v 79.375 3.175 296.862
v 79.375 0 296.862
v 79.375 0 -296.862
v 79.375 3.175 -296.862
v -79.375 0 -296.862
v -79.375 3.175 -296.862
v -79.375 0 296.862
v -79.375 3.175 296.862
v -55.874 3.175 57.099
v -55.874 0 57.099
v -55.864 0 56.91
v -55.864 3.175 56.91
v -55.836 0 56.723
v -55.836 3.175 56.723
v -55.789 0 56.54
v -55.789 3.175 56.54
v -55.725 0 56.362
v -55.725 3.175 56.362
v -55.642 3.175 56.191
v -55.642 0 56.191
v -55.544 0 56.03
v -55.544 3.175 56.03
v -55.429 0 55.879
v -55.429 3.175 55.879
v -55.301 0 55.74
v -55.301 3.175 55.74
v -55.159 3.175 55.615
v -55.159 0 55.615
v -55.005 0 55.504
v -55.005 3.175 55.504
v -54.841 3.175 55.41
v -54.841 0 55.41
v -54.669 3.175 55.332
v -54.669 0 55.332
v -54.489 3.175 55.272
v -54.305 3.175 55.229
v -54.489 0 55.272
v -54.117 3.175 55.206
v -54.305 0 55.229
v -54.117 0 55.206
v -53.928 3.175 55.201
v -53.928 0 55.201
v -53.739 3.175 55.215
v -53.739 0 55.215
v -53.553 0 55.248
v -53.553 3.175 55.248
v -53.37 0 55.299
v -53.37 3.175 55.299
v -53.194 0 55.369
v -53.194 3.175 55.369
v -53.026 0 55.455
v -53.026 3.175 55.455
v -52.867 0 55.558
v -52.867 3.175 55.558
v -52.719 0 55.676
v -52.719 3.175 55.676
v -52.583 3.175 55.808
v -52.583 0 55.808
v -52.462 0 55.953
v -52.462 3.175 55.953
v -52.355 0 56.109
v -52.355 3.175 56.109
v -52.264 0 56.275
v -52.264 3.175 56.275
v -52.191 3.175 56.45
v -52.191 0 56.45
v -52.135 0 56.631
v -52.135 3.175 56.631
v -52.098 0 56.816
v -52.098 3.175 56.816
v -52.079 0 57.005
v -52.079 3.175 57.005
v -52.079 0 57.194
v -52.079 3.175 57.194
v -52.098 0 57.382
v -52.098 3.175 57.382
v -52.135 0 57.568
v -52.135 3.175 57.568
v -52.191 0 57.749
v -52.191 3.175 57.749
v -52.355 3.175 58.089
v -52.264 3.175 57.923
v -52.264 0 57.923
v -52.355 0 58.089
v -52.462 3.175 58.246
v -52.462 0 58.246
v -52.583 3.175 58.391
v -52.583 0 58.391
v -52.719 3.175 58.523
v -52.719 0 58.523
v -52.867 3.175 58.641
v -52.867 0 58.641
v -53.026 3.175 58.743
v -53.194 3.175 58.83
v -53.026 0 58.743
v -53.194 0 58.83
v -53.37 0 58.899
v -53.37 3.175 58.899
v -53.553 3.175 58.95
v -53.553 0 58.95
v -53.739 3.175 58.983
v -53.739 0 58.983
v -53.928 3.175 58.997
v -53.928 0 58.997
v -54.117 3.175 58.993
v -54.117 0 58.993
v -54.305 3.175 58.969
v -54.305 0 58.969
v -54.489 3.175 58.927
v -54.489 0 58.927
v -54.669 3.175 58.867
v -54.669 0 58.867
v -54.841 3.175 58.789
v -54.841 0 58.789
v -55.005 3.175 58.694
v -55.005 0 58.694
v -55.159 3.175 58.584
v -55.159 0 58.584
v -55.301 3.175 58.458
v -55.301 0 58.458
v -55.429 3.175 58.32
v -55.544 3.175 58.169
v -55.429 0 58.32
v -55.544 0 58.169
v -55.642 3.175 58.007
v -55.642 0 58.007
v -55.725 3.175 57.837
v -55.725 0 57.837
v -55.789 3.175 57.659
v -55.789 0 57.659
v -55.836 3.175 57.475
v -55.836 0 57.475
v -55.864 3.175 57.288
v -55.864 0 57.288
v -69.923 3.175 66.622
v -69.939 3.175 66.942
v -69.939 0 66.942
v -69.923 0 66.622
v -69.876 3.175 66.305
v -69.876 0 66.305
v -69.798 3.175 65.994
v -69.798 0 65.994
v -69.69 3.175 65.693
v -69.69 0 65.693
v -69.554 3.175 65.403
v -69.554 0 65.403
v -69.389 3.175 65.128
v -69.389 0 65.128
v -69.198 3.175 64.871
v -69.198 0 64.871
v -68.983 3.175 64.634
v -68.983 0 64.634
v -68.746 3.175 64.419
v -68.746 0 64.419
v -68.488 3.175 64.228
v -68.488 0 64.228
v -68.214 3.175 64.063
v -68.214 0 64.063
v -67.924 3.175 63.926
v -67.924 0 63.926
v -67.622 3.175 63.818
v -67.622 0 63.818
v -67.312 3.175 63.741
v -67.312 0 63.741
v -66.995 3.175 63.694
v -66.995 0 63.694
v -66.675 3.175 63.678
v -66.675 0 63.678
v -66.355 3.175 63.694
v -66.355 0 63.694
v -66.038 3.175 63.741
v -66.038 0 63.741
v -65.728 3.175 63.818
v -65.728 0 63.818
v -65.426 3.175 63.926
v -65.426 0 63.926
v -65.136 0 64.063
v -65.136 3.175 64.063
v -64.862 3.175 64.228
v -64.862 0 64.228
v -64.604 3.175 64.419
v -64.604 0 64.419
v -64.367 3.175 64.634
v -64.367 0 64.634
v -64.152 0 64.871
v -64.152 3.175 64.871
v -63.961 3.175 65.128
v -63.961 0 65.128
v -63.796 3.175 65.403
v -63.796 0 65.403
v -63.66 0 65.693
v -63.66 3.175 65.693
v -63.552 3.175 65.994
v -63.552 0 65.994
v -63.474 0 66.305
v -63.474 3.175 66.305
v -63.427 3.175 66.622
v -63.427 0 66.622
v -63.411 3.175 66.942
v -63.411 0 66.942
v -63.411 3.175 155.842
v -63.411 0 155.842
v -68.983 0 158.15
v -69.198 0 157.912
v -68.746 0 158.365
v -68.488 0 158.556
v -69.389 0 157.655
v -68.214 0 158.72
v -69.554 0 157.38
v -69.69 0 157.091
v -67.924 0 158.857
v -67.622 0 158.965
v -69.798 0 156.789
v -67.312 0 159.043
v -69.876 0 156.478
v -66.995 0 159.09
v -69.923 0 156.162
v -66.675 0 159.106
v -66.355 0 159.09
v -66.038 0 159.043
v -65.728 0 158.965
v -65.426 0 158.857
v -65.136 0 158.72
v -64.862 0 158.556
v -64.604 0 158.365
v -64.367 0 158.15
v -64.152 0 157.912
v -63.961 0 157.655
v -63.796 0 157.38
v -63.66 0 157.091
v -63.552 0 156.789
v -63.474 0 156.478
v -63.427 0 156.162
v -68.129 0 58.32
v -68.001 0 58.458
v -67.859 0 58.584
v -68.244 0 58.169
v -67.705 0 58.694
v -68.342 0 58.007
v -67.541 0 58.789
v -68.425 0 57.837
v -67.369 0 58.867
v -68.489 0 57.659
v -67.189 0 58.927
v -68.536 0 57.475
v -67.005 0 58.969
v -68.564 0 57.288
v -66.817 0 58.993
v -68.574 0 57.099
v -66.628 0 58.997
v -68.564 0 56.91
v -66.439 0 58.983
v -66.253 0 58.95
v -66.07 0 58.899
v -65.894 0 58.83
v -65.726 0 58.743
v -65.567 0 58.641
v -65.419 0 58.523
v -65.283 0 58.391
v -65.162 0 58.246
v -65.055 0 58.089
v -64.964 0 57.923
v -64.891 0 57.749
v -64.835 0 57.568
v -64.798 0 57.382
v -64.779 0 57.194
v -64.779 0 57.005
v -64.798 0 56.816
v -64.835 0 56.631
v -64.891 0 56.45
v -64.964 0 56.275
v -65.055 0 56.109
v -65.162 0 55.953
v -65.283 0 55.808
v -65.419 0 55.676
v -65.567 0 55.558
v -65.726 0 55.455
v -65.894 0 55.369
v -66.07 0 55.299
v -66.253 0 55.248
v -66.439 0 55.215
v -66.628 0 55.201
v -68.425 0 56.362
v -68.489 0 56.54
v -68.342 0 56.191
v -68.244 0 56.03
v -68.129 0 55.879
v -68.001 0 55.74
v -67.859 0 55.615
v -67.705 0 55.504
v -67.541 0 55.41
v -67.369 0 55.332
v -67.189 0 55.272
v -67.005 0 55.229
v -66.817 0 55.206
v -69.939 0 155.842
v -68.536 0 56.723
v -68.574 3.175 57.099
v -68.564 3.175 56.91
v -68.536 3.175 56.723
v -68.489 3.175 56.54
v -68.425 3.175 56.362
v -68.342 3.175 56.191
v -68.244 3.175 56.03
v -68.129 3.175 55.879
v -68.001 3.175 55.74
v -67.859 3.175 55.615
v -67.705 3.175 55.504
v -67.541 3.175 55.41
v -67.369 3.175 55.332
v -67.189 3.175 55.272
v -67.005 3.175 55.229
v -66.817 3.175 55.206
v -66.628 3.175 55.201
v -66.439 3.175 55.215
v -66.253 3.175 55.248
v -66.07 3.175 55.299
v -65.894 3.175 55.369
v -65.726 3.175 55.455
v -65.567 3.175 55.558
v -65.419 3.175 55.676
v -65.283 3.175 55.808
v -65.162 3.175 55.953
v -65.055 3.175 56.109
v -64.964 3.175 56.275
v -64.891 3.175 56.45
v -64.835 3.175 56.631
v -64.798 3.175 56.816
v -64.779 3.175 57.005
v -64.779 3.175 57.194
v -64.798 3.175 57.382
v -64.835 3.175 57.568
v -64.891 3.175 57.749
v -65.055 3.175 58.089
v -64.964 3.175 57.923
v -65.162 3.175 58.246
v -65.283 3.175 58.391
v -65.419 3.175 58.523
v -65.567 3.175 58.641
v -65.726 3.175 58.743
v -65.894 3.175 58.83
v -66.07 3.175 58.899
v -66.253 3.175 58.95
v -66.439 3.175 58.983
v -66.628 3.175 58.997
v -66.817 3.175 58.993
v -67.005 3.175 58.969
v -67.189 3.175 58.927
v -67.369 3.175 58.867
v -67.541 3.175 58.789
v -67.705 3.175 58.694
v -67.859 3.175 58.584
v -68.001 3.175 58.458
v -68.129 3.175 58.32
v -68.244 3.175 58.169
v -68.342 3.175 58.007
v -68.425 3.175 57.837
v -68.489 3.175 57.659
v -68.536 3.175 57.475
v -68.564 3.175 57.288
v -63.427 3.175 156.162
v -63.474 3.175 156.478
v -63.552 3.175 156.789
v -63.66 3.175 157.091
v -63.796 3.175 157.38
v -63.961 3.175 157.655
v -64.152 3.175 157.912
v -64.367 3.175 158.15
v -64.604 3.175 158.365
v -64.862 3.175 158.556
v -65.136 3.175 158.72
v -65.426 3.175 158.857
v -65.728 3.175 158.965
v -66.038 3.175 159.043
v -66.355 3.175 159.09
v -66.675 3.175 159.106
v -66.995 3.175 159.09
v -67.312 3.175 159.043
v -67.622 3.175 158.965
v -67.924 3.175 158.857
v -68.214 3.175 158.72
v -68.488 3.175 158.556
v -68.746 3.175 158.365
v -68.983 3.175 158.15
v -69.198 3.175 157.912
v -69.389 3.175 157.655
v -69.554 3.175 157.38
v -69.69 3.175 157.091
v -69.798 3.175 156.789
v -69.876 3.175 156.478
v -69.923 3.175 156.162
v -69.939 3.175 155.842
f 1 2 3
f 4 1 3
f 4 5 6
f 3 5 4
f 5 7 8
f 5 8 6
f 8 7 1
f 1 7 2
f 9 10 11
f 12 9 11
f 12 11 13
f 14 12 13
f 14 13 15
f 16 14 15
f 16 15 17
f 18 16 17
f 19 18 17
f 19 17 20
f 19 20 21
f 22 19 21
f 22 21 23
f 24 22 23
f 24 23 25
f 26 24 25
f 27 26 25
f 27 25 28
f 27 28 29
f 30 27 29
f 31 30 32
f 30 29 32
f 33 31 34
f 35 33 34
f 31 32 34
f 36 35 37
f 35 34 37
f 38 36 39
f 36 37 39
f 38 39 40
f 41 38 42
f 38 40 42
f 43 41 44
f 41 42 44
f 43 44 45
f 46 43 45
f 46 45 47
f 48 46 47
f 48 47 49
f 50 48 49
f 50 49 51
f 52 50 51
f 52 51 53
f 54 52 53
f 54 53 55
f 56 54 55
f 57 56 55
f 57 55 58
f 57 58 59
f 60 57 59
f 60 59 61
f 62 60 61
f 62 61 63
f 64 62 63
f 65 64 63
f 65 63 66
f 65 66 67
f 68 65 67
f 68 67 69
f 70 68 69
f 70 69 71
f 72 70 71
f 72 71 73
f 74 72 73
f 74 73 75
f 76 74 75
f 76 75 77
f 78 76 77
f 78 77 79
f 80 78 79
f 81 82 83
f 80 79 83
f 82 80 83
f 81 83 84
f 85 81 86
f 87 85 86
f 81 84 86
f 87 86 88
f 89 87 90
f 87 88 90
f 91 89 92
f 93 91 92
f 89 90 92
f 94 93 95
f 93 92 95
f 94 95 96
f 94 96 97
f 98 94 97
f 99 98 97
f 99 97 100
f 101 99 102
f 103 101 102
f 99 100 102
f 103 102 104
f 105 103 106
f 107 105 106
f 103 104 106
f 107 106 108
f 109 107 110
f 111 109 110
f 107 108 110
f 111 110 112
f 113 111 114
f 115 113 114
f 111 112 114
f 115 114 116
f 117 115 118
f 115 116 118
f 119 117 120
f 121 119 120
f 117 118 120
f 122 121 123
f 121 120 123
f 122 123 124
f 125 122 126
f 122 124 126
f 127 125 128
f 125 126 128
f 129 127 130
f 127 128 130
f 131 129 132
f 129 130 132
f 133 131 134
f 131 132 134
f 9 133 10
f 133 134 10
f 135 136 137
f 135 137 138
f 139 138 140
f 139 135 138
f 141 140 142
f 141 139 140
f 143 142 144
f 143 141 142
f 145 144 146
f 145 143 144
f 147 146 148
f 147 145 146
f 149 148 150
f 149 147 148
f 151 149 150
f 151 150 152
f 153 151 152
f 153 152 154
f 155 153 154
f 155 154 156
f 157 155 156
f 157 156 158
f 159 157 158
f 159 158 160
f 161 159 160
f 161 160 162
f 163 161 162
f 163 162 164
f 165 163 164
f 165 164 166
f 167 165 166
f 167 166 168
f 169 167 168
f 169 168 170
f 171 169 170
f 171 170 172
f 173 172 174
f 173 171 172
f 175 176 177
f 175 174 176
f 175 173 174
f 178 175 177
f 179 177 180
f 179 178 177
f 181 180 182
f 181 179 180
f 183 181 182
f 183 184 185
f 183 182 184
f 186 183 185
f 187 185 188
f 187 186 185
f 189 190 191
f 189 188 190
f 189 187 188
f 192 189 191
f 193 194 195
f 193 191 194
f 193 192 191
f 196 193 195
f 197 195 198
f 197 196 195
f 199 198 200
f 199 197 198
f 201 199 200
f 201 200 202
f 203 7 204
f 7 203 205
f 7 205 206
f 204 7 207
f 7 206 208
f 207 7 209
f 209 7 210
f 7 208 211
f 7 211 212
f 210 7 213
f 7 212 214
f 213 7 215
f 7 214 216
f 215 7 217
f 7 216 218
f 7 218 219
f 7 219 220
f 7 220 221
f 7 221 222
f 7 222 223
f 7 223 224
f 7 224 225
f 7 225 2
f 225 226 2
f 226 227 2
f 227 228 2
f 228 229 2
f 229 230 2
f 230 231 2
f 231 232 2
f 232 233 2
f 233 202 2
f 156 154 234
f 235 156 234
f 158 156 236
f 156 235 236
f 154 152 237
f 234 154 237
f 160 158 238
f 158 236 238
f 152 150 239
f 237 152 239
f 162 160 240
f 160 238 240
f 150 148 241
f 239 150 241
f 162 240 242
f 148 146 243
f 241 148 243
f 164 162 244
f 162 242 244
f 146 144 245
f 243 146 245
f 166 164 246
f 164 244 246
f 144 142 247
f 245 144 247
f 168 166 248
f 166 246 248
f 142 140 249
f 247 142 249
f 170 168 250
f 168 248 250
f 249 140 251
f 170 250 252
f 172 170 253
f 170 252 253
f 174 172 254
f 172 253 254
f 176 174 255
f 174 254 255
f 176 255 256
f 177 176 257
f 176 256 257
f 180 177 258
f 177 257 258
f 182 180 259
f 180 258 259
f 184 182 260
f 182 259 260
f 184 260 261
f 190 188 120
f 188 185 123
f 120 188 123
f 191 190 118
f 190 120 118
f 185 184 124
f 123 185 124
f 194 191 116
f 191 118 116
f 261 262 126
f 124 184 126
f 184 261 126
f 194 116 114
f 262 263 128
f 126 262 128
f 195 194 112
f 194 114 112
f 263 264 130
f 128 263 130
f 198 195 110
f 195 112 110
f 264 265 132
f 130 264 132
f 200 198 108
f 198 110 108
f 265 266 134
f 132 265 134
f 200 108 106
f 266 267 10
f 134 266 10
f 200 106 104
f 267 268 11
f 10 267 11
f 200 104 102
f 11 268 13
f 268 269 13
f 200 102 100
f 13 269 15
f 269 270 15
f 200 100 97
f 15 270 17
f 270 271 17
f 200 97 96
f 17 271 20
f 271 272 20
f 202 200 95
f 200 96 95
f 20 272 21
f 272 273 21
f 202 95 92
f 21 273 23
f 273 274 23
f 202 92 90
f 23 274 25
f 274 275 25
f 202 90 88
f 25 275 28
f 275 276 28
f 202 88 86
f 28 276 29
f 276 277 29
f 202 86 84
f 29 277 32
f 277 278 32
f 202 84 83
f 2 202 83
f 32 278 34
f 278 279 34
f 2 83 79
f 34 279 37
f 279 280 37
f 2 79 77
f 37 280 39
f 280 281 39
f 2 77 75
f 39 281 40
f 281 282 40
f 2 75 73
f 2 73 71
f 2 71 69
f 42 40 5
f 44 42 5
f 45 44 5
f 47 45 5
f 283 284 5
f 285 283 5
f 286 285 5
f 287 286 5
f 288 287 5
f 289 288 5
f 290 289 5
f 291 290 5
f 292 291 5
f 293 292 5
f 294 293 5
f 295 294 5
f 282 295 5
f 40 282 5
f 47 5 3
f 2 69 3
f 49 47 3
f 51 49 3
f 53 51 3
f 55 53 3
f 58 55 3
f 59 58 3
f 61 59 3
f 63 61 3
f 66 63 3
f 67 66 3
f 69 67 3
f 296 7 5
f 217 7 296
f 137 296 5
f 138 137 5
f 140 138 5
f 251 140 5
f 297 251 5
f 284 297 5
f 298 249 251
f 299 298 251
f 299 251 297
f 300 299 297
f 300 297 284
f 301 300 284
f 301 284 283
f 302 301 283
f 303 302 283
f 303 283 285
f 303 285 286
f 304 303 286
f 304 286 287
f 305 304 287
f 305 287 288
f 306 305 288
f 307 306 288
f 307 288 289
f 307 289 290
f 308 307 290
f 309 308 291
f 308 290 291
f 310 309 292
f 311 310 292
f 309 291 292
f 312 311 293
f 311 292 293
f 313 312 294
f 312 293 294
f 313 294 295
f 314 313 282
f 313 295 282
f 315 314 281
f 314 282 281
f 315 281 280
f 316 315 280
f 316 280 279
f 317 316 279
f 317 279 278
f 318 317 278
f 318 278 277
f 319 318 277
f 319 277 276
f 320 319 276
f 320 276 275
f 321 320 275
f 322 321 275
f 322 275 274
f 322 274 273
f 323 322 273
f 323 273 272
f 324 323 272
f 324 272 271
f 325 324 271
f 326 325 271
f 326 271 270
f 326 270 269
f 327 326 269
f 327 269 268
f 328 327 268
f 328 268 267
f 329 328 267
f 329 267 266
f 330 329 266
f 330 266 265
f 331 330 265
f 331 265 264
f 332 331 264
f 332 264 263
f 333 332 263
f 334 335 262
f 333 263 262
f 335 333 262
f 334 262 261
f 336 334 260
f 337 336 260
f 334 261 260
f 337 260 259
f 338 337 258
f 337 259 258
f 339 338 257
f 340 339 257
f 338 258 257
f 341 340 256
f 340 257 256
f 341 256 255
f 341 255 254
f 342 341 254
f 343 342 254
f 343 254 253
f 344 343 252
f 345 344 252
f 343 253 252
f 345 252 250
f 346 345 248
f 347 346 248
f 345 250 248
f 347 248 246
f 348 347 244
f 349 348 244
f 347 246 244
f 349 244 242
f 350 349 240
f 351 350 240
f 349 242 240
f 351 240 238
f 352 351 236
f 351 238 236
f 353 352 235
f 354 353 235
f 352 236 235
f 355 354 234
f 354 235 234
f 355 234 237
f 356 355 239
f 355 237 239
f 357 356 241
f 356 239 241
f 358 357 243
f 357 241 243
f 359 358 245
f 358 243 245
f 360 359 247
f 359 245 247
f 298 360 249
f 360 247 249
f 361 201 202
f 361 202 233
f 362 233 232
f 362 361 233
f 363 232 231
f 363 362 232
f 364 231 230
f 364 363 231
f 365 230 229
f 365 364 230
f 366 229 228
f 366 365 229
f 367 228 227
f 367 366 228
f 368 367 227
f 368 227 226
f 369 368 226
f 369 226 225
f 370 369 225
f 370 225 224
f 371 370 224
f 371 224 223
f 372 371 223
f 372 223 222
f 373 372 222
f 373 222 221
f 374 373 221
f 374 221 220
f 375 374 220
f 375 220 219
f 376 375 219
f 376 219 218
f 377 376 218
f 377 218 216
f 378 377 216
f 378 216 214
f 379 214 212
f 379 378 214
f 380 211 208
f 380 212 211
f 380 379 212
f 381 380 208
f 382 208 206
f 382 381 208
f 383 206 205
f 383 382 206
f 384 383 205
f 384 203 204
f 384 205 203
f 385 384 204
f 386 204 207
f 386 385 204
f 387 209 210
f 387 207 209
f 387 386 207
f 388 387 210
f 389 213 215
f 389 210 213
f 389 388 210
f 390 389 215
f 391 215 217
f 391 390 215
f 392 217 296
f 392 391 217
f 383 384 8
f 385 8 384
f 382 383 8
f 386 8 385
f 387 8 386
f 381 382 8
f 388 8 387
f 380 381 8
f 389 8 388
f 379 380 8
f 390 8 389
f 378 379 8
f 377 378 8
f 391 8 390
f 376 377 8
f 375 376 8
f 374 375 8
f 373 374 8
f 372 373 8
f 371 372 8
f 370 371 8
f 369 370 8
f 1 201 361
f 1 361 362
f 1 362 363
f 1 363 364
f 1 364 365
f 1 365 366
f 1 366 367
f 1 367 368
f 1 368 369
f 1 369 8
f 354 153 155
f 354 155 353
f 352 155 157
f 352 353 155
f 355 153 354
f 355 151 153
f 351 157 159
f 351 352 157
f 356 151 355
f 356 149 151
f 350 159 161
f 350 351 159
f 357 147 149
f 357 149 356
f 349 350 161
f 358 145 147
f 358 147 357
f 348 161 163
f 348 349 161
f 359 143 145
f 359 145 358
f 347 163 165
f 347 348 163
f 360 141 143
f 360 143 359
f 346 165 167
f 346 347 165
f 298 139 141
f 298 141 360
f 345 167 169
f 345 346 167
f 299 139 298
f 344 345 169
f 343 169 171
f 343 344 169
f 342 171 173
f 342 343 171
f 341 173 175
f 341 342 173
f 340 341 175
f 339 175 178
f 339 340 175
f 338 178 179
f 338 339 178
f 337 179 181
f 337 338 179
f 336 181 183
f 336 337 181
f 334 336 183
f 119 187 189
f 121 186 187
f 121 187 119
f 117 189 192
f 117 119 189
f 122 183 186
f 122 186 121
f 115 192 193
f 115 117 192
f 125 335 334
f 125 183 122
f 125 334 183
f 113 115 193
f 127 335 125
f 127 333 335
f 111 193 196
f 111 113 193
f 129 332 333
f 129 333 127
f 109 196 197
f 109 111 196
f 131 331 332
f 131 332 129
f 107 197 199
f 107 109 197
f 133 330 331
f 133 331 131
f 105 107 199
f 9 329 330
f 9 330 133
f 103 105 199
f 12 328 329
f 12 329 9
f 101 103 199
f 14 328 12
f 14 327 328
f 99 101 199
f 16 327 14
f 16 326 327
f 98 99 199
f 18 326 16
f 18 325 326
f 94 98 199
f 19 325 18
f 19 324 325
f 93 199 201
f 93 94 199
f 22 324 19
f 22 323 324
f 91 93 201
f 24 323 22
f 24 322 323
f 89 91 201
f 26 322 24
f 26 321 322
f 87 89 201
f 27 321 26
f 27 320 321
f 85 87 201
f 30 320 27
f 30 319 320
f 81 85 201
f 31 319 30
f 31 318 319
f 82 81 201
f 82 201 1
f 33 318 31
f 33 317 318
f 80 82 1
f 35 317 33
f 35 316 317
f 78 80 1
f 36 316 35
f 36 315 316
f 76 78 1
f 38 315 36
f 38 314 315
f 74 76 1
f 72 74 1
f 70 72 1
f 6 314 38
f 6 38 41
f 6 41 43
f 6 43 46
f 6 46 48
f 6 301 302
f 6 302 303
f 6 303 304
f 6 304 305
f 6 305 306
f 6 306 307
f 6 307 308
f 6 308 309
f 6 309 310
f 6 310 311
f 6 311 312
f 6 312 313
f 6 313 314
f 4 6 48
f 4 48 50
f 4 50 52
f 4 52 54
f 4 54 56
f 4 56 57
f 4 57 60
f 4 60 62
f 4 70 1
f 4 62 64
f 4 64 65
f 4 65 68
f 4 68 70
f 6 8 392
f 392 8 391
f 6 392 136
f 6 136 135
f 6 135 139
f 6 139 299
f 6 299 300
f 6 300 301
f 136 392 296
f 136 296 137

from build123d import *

# Parameters (mm, degrees)
SKETCH1_W                 = 158.75
SKETCH1_H                 = 593.725
BOSS_EXTRUDE1_DEPTH       = 3.175
F_6_CLEARANCE_HOLE1_D     = 3.7973
F_6_CLEARANCE_HOLE1_DEPTH = 12.7
F_6_CLEARANCE_HOLE1_TIP   = 1.140824014
CUT_EXTRUDE3_DEPTH        = 308.307362678


with BuildPart() as part:
    # Sketch1 → Boss-Extrude1 (new body)
    with BuildSketch(Plane(origin=(0, 0, 0), x_dir=(1, 0, 0), z_dir=(0, 1, 0))):
        Rectangle(SKETCH1_W, SKETCH1_H)
    extrude(amount=BOSS_EXTRUDE1_DEPTH)

    # #6 Clearance Hole1
    with Locations(Plane(origin=(0, 3.175, 0), x_dir=(1, 0, 0), z_dir=(0, 1, 0))):
        with Locations((-66.675, -57.099200009), (-53.975, -57.099200009)):
            Hole(F_6_CLEARANCE_HOLE1_D / 2, depth=F_6_CLEARANCE_HOLE1_DEPTH)
            with Locations((0, 0, -(F_6_CLEARANCE_HOLE1_DEPTH + F_6_CLEARANCE_HOLE1_TIP / 2))):  # 118° drill point
                Cone(0, F_6_CLEARANCE_HOLE1_D / 2, F_6_CLEARANCE_HOLE1_TIP, mode=Mode.SUBTRACT)

    # Sketch15 → Cut-Extrude3 (cut, through all)
    with BuildSketch(Plane(origin=(0, 3.175, 0), x_dir=(1, 0, 0), z_dir=(0, 1, 0))):
        with BuildLine():
            Line((-63.4111, -66.941700009), (-63.4111, -155.841700009))
            ThreePointArc((-63.4111, -155.841700009), (-66.675, -159.105600009), (-69.9389, -155.841700009))
            Line((-69.9389, -155.841700009), (-69.9389, -66.941700009))
            ThreePointArc((-69.9389, -66.941700009), (-66.675, -63.677800009), (-63.4111, -66.941700009))
        make_face()
    extrude(amount=-CUT_EXTRUDE3_DEPTH, mode=Mode.SUBTRACT)


solid = part.part
